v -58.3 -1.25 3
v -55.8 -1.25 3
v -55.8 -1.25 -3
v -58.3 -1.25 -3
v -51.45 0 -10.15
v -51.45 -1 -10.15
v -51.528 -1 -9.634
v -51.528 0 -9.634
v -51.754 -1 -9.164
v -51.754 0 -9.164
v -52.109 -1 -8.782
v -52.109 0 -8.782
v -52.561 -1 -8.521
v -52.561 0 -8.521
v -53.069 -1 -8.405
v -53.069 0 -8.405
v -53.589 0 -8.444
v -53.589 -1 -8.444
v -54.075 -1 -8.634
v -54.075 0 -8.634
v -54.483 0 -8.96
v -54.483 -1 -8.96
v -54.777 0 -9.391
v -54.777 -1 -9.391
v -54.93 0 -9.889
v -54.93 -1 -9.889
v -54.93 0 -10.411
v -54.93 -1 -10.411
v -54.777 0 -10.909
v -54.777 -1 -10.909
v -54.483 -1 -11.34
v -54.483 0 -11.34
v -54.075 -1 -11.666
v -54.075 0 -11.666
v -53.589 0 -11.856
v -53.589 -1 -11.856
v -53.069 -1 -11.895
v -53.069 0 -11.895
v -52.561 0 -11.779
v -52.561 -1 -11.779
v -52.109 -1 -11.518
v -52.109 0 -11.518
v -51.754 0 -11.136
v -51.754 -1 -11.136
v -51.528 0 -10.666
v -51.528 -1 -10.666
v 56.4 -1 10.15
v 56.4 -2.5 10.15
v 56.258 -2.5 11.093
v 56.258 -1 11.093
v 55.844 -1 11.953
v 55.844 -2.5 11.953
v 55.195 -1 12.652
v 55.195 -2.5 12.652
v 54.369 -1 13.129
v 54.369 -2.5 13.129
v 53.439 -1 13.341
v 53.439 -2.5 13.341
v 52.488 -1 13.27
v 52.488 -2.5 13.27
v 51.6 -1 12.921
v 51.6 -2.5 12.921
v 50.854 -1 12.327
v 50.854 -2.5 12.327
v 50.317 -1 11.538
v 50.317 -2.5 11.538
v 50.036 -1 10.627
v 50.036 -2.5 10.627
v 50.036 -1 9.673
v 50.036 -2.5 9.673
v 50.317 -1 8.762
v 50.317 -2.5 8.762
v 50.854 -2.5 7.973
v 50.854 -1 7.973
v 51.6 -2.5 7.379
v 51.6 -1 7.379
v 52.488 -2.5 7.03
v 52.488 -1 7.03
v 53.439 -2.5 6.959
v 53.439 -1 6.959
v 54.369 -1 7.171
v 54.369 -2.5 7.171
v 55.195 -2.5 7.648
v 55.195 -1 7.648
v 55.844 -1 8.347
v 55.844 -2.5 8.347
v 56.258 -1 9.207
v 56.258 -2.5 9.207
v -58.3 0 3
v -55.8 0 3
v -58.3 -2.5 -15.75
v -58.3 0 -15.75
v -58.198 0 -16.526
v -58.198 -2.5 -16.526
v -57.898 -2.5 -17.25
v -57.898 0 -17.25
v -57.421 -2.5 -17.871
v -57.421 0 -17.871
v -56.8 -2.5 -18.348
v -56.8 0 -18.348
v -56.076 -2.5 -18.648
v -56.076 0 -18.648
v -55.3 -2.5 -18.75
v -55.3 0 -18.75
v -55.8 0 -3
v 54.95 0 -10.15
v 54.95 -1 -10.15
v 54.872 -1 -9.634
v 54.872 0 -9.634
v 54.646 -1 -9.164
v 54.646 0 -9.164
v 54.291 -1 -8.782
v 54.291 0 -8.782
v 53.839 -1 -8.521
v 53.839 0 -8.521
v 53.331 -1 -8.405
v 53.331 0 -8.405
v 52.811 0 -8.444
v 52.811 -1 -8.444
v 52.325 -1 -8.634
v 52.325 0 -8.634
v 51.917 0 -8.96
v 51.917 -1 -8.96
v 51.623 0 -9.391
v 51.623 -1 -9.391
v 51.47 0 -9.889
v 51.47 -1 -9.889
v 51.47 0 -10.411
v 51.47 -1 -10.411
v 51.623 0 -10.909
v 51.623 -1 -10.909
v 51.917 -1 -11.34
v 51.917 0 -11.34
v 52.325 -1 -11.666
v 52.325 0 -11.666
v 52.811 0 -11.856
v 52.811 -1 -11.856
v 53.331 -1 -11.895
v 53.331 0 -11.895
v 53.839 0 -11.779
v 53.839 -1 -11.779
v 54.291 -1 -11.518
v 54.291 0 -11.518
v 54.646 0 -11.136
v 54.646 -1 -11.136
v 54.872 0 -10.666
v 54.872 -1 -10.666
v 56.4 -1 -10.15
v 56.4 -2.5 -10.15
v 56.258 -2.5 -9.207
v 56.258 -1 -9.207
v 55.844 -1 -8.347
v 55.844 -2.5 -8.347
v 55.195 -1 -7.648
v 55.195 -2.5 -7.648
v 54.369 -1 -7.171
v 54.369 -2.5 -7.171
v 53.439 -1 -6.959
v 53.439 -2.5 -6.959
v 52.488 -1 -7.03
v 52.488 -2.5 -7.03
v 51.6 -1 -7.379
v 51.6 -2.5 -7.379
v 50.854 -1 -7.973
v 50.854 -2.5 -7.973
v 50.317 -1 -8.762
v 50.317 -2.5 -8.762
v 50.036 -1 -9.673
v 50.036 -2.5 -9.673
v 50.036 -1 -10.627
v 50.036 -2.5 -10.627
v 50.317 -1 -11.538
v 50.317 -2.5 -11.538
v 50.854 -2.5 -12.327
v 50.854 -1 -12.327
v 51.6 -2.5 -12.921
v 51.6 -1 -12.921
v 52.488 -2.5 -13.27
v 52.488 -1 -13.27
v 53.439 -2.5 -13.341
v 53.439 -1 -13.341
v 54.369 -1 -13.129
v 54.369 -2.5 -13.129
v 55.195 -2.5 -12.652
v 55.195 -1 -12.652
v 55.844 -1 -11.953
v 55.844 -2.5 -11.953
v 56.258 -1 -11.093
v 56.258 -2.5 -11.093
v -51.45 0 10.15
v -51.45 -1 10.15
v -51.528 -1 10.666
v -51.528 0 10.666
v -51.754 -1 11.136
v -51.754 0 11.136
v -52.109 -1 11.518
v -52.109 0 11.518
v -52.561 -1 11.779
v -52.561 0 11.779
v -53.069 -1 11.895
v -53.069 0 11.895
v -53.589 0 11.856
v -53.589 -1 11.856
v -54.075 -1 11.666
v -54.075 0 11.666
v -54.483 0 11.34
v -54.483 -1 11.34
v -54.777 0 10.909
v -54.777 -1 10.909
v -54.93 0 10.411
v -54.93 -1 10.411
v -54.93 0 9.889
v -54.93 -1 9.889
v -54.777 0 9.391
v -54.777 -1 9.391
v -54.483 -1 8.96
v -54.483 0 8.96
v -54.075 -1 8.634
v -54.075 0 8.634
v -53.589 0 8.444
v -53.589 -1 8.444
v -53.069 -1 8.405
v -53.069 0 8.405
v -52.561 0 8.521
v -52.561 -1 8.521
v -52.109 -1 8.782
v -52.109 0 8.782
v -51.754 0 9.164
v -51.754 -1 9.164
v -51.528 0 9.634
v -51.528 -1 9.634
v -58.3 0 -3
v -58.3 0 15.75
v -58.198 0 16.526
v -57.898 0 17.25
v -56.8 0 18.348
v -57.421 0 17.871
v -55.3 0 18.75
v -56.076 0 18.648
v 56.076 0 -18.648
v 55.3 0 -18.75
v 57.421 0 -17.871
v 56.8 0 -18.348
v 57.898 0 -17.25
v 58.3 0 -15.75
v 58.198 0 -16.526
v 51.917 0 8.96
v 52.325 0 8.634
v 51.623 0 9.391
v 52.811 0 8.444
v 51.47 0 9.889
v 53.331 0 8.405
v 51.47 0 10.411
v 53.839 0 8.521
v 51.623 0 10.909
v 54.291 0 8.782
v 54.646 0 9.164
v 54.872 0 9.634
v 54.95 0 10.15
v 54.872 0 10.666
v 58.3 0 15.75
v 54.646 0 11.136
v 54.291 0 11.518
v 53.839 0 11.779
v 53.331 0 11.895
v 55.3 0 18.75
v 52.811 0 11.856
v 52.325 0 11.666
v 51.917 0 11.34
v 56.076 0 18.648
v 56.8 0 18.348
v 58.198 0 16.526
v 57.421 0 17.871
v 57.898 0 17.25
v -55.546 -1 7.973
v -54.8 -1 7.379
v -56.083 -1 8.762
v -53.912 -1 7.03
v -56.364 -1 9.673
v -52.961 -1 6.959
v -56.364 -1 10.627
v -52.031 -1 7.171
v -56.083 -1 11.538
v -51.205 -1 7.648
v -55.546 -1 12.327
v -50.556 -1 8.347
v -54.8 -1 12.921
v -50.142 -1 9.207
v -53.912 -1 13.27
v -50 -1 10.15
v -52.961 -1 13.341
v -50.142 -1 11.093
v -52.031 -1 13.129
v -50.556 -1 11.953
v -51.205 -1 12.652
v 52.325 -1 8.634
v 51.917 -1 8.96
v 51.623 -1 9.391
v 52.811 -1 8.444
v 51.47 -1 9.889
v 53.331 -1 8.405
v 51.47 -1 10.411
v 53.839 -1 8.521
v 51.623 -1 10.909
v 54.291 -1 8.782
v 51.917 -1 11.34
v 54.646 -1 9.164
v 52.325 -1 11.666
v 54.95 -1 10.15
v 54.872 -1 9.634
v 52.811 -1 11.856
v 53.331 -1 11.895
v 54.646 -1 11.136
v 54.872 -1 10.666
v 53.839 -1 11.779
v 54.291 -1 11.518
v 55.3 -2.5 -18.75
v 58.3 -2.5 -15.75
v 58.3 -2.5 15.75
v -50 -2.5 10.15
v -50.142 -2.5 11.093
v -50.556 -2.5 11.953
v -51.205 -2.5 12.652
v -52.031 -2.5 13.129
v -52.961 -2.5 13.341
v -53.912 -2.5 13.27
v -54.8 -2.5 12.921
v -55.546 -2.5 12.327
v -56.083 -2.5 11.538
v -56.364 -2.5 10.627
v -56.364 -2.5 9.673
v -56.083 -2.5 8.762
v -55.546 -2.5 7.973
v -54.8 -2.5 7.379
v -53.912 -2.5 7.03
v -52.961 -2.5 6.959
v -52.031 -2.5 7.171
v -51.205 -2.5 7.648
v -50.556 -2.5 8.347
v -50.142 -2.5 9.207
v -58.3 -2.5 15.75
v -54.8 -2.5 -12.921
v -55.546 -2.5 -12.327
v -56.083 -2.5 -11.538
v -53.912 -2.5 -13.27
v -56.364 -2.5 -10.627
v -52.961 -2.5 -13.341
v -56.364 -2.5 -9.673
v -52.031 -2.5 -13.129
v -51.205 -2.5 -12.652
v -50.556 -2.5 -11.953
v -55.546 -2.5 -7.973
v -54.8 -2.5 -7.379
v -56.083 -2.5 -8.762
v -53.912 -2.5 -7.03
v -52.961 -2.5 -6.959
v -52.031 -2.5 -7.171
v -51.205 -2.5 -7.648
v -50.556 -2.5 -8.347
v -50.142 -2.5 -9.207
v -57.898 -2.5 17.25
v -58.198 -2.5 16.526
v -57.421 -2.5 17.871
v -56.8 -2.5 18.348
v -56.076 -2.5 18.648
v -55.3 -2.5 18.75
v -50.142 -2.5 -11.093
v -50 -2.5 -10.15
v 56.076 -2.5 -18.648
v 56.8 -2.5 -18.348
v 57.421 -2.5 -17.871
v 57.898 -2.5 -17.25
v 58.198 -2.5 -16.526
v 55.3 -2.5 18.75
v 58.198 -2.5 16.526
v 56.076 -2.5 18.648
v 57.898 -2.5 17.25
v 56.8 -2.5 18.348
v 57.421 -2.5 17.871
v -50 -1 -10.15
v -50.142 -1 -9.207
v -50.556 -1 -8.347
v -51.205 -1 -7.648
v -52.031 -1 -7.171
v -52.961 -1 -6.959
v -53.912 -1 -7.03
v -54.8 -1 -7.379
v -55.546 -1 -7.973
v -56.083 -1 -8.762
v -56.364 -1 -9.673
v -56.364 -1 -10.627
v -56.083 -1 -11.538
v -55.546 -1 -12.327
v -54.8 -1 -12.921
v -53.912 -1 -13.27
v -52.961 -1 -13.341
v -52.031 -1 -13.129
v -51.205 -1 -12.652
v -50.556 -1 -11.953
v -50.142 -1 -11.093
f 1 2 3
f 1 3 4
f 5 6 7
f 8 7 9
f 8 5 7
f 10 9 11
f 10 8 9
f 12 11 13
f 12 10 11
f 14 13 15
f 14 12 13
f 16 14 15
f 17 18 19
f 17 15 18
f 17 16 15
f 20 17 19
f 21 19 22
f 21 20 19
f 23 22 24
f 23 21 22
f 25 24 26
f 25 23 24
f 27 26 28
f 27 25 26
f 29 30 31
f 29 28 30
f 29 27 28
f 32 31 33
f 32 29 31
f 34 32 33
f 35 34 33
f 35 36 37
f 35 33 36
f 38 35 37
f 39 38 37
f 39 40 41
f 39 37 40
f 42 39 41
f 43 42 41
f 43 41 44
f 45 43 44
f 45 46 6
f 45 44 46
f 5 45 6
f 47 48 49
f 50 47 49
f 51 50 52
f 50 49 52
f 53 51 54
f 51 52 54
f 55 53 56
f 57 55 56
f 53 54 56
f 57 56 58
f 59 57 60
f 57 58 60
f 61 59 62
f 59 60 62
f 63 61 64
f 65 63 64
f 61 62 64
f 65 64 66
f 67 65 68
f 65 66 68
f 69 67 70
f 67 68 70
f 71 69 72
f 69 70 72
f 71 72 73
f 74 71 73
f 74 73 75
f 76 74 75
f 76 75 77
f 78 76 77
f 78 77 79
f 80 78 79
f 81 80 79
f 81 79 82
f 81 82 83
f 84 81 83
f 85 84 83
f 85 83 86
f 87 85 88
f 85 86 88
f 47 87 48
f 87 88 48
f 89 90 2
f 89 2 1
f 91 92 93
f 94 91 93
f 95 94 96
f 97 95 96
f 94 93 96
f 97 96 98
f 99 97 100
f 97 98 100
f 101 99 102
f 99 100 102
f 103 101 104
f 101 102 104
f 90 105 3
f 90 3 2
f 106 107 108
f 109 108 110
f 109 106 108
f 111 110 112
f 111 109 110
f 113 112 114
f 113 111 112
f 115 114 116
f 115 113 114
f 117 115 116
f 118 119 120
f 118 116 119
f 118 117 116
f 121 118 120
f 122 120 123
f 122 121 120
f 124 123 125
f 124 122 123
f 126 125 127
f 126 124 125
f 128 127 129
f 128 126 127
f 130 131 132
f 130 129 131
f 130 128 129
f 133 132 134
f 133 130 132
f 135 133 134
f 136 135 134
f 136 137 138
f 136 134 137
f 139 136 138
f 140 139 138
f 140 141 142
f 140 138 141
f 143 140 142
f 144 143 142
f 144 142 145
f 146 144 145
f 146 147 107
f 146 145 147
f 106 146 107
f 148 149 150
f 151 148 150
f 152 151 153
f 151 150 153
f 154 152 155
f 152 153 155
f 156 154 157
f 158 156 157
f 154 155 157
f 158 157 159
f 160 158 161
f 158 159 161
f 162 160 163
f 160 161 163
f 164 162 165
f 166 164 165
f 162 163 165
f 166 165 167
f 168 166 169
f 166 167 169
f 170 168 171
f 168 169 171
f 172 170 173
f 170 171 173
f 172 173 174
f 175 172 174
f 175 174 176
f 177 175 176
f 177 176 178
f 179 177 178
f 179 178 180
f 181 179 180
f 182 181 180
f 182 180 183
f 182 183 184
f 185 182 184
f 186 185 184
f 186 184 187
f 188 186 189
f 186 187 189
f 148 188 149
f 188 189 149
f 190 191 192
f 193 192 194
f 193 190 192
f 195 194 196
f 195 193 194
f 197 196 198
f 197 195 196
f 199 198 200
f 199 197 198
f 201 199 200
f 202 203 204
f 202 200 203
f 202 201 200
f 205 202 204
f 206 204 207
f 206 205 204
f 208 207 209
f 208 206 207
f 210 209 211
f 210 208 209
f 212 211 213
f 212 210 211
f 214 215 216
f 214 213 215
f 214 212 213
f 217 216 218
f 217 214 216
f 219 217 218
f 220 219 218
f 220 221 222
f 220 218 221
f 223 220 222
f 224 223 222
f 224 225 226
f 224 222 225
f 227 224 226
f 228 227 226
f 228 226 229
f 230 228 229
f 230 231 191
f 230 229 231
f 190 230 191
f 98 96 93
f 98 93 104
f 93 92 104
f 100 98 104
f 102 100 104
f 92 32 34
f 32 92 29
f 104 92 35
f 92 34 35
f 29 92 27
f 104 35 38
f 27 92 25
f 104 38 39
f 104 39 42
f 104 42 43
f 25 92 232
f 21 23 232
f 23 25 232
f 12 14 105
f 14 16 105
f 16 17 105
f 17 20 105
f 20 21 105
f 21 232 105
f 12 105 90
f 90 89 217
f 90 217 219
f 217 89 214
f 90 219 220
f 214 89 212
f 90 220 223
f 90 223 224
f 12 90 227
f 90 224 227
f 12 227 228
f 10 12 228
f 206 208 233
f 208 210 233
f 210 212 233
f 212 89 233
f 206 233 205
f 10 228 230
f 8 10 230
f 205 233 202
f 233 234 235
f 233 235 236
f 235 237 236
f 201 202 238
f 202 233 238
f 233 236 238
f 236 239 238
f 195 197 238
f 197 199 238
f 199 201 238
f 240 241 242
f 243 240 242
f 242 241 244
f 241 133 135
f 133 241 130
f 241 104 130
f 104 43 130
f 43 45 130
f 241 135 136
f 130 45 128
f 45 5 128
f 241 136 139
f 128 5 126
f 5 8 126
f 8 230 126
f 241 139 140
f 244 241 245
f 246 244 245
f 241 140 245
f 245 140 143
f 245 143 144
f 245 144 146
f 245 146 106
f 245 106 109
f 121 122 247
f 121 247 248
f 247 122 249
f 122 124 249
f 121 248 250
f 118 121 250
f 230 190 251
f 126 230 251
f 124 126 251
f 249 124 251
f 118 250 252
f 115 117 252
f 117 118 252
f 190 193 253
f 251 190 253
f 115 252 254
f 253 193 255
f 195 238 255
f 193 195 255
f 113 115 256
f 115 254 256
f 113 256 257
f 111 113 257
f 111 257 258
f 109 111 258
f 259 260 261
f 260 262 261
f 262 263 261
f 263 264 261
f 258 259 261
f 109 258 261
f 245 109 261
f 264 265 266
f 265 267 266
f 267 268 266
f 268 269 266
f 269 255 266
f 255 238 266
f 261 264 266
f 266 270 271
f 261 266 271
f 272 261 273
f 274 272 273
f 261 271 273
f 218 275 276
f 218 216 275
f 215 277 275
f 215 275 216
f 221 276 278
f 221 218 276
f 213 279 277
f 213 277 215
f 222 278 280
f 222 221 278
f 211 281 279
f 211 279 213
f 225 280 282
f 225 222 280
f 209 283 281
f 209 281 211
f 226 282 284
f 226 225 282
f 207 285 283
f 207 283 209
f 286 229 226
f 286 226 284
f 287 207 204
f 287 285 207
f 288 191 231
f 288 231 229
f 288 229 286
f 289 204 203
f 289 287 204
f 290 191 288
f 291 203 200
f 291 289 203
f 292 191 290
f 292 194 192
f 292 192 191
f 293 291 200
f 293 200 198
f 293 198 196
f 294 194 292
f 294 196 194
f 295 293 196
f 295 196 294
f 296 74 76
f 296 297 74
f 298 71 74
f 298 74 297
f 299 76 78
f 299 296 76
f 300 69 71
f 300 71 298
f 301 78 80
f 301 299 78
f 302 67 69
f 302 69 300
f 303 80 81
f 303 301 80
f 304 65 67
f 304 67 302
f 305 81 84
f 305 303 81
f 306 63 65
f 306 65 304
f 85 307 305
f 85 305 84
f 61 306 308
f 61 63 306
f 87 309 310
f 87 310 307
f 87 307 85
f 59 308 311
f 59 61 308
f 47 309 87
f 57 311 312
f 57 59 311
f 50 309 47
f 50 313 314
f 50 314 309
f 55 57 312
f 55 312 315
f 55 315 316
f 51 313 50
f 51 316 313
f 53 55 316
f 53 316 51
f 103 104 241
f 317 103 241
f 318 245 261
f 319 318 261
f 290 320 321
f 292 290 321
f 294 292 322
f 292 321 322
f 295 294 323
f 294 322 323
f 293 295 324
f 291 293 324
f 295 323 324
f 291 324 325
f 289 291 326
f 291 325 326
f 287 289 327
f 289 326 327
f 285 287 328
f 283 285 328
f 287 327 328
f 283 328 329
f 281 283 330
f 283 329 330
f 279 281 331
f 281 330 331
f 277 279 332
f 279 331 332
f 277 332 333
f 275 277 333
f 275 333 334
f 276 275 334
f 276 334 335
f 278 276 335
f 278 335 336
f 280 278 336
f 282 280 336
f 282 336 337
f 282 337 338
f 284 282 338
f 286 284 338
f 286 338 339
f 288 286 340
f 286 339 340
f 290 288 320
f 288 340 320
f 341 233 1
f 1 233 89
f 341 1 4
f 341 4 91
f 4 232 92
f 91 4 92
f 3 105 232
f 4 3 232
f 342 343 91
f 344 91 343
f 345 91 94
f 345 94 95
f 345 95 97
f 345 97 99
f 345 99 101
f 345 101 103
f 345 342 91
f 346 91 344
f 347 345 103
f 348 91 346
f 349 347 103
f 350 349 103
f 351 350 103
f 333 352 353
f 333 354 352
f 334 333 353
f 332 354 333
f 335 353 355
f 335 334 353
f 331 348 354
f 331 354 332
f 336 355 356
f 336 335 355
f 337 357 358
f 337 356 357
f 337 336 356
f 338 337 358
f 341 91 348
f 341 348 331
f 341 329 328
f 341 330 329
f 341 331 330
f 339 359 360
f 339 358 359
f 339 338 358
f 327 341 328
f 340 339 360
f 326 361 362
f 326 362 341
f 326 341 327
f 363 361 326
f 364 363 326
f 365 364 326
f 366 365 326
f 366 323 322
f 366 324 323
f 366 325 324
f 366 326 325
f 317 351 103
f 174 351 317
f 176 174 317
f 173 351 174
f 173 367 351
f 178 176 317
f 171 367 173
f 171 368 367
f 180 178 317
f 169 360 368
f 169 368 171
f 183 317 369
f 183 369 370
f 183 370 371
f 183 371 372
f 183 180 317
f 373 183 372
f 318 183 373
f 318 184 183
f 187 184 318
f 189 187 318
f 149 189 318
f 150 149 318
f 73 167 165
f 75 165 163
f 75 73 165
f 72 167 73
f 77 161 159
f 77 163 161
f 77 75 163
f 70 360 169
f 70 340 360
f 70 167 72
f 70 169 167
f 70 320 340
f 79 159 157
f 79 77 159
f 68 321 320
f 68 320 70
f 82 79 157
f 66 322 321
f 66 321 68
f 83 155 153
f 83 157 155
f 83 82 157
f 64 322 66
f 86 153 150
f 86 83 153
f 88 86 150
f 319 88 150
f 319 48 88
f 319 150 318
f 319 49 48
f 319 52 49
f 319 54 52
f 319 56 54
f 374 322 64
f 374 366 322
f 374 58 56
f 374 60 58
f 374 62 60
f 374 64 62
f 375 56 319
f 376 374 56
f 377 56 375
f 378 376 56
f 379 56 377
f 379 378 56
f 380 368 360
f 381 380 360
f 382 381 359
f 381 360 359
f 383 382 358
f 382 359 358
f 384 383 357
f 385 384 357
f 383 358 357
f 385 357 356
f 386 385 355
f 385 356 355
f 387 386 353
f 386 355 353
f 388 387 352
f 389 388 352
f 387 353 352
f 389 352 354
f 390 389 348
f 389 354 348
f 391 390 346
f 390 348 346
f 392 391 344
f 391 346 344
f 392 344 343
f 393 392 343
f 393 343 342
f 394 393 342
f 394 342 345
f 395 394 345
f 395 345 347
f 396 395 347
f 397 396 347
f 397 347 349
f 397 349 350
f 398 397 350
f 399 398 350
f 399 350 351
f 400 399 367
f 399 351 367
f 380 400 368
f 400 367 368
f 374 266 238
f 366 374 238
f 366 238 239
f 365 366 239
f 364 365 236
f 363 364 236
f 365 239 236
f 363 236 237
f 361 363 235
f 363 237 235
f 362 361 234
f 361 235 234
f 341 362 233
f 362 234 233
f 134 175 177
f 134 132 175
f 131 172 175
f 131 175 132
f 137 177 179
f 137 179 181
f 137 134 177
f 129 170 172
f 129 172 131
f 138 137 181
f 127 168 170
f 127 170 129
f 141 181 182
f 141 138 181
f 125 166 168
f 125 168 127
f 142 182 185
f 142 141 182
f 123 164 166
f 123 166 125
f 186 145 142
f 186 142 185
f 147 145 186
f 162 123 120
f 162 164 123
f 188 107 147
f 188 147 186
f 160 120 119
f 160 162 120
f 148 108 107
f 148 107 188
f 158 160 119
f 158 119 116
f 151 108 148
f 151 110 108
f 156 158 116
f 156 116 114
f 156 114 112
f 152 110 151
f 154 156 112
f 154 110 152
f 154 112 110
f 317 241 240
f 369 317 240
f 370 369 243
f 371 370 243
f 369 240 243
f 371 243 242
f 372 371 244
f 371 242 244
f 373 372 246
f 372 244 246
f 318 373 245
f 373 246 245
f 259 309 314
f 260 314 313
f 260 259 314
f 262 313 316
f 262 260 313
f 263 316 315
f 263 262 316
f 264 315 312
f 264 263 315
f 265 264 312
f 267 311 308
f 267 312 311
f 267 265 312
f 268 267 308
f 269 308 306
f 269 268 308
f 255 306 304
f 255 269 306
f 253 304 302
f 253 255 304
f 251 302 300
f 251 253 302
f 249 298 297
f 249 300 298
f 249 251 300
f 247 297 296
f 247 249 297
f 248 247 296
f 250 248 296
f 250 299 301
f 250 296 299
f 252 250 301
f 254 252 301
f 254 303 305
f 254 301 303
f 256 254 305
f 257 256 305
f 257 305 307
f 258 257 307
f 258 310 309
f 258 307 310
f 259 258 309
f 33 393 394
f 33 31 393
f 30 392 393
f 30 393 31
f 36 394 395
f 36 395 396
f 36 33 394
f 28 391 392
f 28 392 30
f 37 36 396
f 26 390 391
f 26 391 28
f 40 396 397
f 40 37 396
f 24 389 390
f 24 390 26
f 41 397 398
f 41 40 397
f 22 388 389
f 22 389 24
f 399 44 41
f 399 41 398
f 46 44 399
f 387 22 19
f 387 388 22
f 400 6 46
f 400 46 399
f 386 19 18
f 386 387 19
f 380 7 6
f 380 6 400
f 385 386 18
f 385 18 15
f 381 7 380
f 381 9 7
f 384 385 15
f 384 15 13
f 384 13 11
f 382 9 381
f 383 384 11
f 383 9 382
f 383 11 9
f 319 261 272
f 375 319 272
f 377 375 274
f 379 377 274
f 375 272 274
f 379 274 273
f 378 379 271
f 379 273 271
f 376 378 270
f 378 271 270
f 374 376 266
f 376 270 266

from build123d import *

# Parameters (mm, degrees)
F0_R     = 1.75
F1_DEPTH = 2.5
F2_R     = 3.2
F3_DEPTH = 1.5
F4_W     = 2.5
F4_H     = 6
F5_DEPTH = 1.25


with BuildPart() as f1:
    # F0 (on Front) → F1 (new body)
    with BuildSketch(Plane.XZ):
        with BuildLine():
            Line((55.3, 18.75), (-55.3, 18.75))
            ThreePointArc((-55.3, 18.75), (-57.42132, 17.87132), (-58.3, 15.75))
            Line((-58.3, 15.75), (-58.3, -15.75))
            ThreePointArc((-58.3, -15.75), (-57.42132, -17.87132), (-55.3, -18.75))
            Line((-55.3, -18.75), (55.3, -18.75))
            ThreePointArc((55.3, -18.75), (57.42132, -17.87132), (58.3, -15.75))
            Line((58.3, -15.75), (58.3, 15.75))
            ThreePointArc((58.3, 15.75), (57.42132, 17.87132), (55.3, 18.75))
        make_face()
        with Locations((-53.2, -10.15)):
            Circle(F0_R, mode=Mode.SUBTRACT)
        with Locations((53.2, -10.15)):
            Circle(F0_R, mode=Mode.SUBTRACT)
        with Locations((-53.2, 10.15)):
            Circle(F0_R, mode=Mode.SUBTRACT)
        with Locations((53.2, 10.15)):
            Circle(F0_R, mode=Mode.SUBTRACT)
    extrude(amount=F1_DEPTH)

    # F2 (on face) → F3 (cut)
    with BuildSketch(Plane.XZ.offset(2.5)):
        with Locations((-53.2, 10.15)):
            Circle(F2_R)
        with Locations((53.2, 10.15)):
            Circle(F2_R)
        with Locations((-53.2, -10.15)):
            Circle(F2_R)
        with Locations((53.2, -10.15)):
            Circle(F2_R)
    extrude(amount=-F3_DEPTH, mode=Mode.SUBTRACT)

    # F4 (on face) → F5 (cut)
    with BuildSketch(Plane(origin=(0, 0, 0), x_dir=(-1, 0, 0), z_dir=(0, 1, 0))):
        with Locations((57.05, 0)):
            Rectangle(F4_W, F4_H)
    extrude(amount=-F5_DEPTH, mode=Mode.SUBTRACT)


solid = f1.part
